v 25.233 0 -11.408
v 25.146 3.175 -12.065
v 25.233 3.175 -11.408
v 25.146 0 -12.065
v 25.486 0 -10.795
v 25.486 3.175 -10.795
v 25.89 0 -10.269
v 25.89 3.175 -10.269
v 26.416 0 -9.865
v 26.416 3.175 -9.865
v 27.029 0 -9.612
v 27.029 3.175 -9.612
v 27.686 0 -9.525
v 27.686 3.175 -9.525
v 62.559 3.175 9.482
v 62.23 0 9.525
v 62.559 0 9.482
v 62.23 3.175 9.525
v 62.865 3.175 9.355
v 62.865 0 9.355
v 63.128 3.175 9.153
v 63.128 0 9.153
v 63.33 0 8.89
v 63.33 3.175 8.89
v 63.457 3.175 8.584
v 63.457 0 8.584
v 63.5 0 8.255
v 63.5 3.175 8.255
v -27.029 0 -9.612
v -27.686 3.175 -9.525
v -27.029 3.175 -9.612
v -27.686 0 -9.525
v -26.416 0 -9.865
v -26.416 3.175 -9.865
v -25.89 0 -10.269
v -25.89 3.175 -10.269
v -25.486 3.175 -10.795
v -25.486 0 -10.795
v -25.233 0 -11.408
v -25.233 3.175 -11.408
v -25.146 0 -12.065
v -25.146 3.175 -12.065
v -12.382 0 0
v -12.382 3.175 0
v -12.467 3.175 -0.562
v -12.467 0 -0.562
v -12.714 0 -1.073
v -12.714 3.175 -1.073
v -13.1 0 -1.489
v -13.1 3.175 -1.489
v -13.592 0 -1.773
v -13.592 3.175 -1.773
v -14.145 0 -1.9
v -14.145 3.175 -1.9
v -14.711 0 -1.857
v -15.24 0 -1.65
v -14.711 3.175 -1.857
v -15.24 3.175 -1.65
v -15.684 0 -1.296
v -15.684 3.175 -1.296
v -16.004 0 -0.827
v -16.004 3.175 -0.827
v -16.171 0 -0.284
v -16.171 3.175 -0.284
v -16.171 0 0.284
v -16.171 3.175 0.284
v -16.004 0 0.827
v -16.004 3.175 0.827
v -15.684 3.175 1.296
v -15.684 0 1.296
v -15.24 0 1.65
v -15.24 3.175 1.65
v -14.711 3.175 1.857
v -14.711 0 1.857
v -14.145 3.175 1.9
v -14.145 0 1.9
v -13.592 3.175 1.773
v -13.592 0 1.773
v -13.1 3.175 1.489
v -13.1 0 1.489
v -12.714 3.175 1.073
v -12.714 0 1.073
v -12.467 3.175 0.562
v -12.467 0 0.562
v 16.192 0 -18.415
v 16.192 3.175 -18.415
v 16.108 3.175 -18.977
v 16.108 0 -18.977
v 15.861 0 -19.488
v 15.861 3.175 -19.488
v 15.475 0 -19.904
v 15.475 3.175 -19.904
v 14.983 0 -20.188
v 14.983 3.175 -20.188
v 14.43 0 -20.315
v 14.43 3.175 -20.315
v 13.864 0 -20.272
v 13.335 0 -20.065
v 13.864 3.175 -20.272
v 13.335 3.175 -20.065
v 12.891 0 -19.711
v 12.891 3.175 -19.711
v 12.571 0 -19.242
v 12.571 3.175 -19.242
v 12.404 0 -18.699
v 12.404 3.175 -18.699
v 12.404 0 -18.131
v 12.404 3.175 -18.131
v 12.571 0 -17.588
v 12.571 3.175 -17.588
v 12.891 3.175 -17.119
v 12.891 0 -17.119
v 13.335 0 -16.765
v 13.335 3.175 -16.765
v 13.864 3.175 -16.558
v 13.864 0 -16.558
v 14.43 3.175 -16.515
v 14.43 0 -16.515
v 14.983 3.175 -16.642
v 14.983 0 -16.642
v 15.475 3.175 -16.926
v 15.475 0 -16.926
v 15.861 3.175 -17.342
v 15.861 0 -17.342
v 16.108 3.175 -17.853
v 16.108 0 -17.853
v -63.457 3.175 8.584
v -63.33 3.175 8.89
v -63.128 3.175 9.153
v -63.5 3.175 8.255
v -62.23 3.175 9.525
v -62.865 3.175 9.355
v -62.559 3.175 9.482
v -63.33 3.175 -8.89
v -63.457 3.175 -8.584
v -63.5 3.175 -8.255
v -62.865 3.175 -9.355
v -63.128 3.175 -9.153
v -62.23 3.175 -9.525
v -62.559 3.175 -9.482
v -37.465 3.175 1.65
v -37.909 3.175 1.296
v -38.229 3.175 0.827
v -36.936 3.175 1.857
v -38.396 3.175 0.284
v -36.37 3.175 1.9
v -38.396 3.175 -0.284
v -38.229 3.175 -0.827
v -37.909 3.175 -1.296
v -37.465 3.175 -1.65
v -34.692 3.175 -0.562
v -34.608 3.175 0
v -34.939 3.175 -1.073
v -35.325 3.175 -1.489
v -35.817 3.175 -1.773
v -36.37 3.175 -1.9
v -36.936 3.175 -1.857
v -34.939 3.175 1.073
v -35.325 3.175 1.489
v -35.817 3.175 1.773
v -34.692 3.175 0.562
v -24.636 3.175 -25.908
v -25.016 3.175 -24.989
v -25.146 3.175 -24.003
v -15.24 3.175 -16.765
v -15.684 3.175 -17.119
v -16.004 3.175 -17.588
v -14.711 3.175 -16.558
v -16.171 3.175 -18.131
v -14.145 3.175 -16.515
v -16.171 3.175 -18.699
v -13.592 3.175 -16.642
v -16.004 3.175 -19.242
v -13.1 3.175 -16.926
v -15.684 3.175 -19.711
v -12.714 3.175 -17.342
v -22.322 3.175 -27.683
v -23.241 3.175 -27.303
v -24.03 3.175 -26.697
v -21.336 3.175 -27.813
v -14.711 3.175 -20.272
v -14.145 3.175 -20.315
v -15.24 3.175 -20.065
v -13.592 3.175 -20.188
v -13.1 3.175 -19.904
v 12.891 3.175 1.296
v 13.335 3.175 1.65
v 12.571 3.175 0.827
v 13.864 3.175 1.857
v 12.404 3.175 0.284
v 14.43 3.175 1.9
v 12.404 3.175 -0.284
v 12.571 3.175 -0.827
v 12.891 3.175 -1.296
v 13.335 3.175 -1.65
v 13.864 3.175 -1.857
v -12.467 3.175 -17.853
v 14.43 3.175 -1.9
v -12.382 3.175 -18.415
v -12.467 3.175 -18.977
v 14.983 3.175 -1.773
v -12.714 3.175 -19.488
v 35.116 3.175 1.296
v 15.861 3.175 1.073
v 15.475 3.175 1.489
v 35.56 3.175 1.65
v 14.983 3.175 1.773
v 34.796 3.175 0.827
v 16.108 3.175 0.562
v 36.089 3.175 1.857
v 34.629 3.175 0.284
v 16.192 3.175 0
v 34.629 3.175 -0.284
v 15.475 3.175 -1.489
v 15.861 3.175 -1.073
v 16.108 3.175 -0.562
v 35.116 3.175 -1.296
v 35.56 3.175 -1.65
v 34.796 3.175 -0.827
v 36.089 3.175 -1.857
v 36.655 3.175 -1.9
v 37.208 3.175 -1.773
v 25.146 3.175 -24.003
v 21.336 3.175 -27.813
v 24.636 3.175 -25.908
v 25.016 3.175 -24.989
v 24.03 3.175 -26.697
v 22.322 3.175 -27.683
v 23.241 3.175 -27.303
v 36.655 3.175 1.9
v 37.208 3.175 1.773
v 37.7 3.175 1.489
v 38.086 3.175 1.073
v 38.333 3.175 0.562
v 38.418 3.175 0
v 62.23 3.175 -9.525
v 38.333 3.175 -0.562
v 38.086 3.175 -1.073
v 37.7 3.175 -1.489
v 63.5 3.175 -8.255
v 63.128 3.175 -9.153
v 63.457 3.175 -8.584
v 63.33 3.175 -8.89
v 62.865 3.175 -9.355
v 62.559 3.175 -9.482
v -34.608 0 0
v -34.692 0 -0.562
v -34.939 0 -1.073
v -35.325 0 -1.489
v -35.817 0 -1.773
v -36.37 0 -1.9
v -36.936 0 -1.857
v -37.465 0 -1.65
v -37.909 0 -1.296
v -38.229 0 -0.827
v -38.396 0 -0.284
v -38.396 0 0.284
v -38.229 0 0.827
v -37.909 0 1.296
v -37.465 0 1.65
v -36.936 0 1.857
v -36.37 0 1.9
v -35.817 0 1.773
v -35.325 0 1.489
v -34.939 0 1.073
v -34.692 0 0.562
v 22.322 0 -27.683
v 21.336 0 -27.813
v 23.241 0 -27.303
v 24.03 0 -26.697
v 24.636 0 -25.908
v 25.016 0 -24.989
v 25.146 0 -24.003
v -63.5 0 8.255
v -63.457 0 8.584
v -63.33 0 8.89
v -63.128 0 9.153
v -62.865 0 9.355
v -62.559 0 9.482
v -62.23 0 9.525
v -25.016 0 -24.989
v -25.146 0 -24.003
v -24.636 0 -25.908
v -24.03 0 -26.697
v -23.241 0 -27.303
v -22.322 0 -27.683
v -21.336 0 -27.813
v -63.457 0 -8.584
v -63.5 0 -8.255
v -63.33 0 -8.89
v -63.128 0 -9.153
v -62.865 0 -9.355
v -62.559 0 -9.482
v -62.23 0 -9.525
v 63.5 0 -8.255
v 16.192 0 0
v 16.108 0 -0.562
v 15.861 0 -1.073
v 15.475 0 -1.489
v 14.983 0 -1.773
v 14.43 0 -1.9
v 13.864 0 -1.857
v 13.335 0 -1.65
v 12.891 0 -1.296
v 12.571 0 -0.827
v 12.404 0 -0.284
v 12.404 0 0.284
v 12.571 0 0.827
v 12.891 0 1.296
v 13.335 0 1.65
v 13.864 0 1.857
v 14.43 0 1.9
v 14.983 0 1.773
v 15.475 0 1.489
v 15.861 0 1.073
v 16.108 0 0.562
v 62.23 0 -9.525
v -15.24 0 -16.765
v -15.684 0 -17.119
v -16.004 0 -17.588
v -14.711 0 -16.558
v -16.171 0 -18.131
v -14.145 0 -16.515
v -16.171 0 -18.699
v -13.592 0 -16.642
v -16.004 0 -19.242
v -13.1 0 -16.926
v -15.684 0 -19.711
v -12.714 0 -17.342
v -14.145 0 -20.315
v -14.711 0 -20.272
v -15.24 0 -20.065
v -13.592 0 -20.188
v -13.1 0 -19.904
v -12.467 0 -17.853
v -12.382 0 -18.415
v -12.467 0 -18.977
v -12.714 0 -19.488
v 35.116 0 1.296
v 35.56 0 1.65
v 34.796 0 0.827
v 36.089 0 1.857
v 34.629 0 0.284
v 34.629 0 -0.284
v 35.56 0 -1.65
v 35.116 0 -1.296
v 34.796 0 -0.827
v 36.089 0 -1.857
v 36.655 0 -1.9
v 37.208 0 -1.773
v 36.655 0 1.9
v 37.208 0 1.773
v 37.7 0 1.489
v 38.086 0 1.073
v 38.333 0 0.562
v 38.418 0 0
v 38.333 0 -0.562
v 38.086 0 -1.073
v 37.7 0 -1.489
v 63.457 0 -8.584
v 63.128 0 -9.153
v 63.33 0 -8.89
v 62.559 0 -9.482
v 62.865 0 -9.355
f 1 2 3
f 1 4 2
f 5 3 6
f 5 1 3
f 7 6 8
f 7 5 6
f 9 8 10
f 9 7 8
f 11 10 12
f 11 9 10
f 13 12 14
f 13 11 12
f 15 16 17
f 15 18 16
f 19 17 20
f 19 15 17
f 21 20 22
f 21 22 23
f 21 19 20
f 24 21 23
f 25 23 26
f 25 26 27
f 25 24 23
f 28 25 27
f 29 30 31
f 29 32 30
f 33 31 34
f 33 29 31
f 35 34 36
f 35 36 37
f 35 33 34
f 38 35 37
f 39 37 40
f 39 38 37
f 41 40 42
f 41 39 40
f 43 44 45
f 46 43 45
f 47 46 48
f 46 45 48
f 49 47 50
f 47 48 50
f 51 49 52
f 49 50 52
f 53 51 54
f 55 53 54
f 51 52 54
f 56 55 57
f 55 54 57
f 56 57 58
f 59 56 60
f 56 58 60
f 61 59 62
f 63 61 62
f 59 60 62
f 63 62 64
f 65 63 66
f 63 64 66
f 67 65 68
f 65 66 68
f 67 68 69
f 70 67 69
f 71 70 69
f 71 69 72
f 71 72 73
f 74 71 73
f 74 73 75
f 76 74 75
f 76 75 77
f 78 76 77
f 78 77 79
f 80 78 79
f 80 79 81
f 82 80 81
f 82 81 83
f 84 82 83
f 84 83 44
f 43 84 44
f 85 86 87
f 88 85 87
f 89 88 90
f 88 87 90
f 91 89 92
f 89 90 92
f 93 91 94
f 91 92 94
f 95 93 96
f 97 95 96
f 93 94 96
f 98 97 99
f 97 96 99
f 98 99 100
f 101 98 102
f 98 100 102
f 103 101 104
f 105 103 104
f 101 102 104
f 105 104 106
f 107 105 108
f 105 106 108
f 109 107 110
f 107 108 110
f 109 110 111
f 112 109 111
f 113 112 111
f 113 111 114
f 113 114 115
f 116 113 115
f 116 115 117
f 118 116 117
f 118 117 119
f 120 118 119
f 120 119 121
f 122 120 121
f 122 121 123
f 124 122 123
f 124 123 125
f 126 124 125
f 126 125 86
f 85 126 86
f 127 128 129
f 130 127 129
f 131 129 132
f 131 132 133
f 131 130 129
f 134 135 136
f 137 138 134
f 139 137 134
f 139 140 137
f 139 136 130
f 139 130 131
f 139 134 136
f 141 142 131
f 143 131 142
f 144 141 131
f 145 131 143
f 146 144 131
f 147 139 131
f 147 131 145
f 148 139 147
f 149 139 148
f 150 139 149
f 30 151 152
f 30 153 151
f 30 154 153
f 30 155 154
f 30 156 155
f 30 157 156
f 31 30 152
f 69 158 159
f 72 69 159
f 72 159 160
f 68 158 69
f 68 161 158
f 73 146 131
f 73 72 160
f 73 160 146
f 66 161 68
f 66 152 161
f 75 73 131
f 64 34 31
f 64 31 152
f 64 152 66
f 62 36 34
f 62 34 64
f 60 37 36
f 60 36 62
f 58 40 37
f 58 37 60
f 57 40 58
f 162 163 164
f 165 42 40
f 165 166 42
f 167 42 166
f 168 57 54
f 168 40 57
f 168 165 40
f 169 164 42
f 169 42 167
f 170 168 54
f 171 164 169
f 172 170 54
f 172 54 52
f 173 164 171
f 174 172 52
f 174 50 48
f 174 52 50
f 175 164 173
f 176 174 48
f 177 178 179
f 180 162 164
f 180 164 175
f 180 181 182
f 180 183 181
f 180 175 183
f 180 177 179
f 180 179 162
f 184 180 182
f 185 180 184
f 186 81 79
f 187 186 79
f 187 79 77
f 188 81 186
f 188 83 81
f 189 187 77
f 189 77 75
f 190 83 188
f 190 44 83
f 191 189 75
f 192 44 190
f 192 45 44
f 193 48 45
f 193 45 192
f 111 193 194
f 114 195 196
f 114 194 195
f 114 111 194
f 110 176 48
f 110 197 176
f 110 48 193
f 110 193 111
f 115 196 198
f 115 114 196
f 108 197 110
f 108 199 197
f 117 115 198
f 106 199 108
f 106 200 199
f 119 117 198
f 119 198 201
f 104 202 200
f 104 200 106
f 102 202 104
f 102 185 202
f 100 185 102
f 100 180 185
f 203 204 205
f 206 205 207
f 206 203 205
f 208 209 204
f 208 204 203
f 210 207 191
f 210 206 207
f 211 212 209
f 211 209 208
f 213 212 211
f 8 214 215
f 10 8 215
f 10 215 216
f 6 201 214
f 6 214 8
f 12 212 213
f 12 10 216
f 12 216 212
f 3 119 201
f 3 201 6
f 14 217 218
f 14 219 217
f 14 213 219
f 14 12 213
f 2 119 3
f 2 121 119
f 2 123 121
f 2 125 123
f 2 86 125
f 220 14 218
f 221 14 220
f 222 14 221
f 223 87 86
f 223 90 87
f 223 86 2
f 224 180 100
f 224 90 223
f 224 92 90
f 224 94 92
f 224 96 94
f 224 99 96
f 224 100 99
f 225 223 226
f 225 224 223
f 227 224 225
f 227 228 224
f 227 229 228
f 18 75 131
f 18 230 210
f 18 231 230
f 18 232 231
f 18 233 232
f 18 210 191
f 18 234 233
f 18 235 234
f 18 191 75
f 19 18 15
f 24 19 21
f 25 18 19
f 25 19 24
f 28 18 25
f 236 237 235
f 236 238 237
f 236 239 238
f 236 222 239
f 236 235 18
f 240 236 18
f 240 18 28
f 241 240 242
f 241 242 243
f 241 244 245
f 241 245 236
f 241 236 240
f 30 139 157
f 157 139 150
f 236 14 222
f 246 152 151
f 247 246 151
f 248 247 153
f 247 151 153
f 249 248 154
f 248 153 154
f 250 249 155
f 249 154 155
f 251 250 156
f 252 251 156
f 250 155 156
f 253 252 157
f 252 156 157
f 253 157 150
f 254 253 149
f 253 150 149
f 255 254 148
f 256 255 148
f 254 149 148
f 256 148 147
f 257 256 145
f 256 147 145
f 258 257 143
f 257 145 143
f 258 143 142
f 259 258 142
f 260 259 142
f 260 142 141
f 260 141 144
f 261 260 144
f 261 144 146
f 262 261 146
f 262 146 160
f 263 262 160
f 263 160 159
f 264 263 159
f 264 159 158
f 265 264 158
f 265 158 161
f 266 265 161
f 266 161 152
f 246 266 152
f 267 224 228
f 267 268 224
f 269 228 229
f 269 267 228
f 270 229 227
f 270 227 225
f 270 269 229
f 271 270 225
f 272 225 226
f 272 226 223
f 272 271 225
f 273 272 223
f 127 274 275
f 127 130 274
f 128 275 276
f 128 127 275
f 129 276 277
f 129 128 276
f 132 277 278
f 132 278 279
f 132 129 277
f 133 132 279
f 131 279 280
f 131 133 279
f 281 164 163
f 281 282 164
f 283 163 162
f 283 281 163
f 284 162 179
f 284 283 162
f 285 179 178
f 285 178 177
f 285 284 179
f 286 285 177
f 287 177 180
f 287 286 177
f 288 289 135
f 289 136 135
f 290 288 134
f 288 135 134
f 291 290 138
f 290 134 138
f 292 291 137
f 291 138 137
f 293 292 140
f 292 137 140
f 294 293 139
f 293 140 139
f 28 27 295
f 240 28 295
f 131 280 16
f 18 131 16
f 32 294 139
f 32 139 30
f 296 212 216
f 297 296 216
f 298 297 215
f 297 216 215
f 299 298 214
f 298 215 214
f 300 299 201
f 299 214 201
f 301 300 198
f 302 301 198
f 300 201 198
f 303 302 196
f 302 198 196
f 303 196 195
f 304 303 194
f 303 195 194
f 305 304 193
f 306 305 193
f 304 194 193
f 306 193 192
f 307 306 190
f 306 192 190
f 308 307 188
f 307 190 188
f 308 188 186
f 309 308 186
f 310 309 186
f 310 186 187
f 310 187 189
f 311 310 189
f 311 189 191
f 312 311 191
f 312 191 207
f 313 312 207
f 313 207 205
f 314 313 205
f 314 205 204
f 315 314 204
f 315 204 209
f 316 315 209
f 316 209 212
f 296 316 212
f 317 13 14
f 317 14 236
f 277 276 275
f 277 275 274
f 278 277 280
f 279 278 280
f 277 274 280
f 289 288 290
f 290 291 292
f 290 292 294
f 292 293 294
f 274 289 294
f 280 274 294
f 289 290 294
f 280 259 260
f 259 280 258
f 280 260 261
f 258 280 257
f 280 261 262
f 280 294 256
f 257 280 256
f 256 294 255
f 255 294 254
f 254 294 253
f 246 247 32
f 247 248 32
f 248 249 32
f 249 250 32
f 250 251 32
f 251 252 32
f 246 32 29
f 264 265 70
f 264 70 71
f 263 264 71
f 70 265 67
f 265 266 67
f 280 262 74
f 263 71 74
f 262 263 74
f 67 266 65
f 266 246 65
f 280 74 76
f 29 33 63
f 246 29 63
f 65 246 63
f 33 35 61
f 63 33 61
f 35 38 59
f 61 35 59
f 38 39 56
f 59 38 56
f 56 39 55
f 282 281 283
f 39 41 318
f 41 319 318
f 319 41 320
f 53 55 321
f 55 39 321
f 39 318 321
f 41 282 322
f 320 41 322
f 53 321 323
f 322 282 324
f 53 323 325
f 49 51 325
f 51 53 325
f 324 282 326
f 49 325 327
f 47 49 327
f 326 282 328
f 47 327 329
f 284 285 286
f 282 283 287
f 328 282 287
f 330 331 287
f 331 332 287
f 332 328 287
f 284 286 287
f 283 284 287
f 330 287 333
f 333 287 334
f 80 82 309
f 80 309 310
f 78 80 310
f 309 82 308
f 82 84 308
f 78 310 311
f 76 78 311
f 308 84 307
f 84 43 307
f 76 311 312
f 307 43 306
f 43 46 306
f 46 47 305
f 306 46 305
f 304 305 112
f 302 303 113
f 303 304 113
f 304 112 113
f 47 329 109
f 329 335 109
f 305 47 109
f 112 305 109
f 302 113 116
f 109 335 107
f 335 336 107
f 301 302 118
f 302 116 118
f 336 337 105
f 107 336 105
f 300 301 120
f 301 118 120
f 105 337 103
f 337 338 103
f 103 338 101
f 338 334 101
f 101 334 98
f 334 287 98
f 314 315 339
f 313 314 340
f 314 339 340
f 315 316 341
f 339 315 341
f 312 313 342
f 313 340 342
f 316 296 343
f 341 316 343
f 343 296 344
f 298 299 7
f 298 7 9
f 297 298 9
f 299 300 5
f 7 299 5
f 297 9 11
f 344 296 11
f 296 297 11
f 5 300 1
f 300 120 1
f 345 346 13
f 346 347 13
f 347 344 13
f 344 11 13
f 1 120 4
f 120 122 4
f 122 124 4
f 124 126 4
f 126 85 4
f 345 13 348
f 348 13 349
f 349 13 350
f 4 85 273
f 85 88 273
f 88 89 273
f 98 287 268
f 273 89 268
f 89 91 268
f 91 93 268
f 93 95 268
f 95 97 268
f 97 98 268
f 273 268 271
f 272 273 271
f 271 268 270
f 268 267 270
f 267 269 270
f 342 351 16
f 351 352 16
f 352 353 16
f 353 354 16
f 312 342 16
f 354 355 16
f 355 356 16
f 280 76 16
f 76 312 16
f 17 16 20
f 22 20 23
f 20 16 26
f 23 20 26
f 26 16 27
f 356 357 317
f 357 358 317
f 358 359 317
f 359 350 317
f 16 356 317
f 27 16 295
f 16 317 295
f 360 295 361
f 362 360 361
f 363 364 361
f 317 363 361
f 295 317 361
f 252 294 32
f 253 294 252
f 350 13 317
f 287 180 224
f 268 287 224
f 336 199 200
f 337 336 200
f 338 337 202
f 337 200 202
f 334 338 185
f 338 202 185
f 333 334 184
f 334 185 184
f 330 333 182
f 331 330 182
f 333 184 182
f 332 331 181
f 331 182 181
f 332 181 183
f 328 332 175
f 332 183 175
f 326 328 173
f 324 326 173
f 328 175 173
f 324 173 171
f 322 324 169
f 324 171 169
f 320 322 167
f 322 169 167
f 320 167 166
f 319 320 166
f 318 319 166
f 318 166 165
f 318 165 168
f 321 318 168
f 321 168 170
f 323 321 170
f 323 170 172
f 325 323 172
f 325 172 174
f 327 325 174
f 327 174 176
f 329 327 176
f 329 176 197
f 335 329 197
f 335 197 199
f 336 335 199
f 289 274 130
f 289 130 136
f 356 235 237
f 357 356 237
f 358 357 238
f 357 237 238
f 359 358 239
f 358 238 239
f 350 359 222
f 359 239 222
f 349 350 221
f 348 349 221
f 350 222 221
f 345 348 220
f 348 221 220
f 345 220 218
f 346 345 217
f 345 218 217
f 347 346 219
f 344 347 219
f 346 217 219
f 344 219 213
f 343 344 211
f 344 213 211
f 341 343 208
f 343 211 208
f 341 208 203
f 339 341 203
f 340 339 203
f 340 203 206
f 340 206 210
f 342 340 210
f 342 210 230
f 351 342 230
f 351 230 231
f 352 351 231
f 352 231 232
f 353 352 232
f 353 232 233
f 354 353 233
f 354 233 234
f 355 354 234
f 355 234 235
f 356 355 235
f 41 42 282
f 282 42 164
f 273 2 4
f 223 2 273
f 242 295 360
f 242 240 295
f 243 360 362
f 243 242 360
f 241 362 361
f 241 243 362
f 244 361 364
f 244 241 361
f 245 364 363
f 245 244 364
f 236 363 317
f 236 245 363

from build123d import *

# Parameters (mm, degrees)
SKETCH1_W           = 127
SKETCH1_H           = 19.05
BOSS_EXTRUDE1_DEPTH = 3.175
SKETCH3_W           = 50.292
SKETCH3_H           = 18.288
BOSS_EXTRUDE2_DEPTH = 3.175
SKETCH2_R           = 1.905
CUT_EXTRUDE1_DEPTH  = 4.175
FILLET1_R           = 1.27
FILLET2_R           = 2.54
FILLET3_R           = 3.81


with BuildPart() as part:
    # Sketch1 → Boss-Extrude1 (new body)
    with BuildSketch(Plane(origin=(0, 0, 0), x_dir=(1, 0, 0), z_dir=(0, 1, 0))):
        Rectangle(SKETCH1_W, SKETCH1_H)
    extrude(amount=BOSS_EXTRUDE1_DEPTH)

    # Sketch3 → Boss-Extrude2 (add, through all)
    with BuildSketch(Plane(origin=(0, 3.175, 0), x_dir=(1, 0, 0), z_dir=(0, 1, 0))):
        with Locations((0, 18.669)):
            Rectangle(SKETCH3_W, SKETCH3_H)
    extrude(amount=-BOSS_EXTRUDE2_DEPTH)

    # Sketch2 → Cut-Extrude1 (cut, through all)
    with BuildSketch(Plane(origin=(0, 3.175, 0), x_dir=(1, 0, 0), z_dir=(0, 1, 0))):
        with Locations((-36.5125, 0)):
            Circle(SKETCH2_R)
        with Locations((36.5125, 0)):
            Circle(SKETCH2_R)
        with Locations((-14.2875, 0)):
            Circle(SKETCH2_R)
        with Locations((14.2875, 0)):
            Circle(SKETCH2_R)
        with Locations((-14.2875, 18.415)):
            Circle(SKETCH2_R)
        with Locations((14.2875, 18.415)):
            Circle(SKETCH2_R)
    extrude(amount=-CUT_EXTRUDE1_DEPTH, mode=Mode.SUBTRACT)

    # Fillet1
    fillet1_edges = [part.edges().sort_by_distance(p)[0] for p in [
        (63.5, 1.5875, 9.525),
        (-63.5, 1.5875, 9.525),
        (-63.5, 1.5875, -9.525),
        (63.5, 1.5875, -9.525),
    ]]
    fillet(fillet1_edges, radius=FILLET1_R)

    # Fillet2
    fillet2_edges = [part.edges().sort_by_distance(p)[0] for p in [
        (-25.146, 1.5875, -9.525),
        (25.146, 1.5875, -9.525),
    ]]
    fillet(fillet2_edges, radius=FILLET2_R)

    # Fillet3
    fillet3_edges = [part.edges().sort_by_distance(p)[0] for p in [
        (-25.146, 1.5875, -27.813),
        (25.146, 1.5875, -27.813),
    ]]
    fillet(fillet3_edges, radius=FILLET3_R)


solid = part.part
